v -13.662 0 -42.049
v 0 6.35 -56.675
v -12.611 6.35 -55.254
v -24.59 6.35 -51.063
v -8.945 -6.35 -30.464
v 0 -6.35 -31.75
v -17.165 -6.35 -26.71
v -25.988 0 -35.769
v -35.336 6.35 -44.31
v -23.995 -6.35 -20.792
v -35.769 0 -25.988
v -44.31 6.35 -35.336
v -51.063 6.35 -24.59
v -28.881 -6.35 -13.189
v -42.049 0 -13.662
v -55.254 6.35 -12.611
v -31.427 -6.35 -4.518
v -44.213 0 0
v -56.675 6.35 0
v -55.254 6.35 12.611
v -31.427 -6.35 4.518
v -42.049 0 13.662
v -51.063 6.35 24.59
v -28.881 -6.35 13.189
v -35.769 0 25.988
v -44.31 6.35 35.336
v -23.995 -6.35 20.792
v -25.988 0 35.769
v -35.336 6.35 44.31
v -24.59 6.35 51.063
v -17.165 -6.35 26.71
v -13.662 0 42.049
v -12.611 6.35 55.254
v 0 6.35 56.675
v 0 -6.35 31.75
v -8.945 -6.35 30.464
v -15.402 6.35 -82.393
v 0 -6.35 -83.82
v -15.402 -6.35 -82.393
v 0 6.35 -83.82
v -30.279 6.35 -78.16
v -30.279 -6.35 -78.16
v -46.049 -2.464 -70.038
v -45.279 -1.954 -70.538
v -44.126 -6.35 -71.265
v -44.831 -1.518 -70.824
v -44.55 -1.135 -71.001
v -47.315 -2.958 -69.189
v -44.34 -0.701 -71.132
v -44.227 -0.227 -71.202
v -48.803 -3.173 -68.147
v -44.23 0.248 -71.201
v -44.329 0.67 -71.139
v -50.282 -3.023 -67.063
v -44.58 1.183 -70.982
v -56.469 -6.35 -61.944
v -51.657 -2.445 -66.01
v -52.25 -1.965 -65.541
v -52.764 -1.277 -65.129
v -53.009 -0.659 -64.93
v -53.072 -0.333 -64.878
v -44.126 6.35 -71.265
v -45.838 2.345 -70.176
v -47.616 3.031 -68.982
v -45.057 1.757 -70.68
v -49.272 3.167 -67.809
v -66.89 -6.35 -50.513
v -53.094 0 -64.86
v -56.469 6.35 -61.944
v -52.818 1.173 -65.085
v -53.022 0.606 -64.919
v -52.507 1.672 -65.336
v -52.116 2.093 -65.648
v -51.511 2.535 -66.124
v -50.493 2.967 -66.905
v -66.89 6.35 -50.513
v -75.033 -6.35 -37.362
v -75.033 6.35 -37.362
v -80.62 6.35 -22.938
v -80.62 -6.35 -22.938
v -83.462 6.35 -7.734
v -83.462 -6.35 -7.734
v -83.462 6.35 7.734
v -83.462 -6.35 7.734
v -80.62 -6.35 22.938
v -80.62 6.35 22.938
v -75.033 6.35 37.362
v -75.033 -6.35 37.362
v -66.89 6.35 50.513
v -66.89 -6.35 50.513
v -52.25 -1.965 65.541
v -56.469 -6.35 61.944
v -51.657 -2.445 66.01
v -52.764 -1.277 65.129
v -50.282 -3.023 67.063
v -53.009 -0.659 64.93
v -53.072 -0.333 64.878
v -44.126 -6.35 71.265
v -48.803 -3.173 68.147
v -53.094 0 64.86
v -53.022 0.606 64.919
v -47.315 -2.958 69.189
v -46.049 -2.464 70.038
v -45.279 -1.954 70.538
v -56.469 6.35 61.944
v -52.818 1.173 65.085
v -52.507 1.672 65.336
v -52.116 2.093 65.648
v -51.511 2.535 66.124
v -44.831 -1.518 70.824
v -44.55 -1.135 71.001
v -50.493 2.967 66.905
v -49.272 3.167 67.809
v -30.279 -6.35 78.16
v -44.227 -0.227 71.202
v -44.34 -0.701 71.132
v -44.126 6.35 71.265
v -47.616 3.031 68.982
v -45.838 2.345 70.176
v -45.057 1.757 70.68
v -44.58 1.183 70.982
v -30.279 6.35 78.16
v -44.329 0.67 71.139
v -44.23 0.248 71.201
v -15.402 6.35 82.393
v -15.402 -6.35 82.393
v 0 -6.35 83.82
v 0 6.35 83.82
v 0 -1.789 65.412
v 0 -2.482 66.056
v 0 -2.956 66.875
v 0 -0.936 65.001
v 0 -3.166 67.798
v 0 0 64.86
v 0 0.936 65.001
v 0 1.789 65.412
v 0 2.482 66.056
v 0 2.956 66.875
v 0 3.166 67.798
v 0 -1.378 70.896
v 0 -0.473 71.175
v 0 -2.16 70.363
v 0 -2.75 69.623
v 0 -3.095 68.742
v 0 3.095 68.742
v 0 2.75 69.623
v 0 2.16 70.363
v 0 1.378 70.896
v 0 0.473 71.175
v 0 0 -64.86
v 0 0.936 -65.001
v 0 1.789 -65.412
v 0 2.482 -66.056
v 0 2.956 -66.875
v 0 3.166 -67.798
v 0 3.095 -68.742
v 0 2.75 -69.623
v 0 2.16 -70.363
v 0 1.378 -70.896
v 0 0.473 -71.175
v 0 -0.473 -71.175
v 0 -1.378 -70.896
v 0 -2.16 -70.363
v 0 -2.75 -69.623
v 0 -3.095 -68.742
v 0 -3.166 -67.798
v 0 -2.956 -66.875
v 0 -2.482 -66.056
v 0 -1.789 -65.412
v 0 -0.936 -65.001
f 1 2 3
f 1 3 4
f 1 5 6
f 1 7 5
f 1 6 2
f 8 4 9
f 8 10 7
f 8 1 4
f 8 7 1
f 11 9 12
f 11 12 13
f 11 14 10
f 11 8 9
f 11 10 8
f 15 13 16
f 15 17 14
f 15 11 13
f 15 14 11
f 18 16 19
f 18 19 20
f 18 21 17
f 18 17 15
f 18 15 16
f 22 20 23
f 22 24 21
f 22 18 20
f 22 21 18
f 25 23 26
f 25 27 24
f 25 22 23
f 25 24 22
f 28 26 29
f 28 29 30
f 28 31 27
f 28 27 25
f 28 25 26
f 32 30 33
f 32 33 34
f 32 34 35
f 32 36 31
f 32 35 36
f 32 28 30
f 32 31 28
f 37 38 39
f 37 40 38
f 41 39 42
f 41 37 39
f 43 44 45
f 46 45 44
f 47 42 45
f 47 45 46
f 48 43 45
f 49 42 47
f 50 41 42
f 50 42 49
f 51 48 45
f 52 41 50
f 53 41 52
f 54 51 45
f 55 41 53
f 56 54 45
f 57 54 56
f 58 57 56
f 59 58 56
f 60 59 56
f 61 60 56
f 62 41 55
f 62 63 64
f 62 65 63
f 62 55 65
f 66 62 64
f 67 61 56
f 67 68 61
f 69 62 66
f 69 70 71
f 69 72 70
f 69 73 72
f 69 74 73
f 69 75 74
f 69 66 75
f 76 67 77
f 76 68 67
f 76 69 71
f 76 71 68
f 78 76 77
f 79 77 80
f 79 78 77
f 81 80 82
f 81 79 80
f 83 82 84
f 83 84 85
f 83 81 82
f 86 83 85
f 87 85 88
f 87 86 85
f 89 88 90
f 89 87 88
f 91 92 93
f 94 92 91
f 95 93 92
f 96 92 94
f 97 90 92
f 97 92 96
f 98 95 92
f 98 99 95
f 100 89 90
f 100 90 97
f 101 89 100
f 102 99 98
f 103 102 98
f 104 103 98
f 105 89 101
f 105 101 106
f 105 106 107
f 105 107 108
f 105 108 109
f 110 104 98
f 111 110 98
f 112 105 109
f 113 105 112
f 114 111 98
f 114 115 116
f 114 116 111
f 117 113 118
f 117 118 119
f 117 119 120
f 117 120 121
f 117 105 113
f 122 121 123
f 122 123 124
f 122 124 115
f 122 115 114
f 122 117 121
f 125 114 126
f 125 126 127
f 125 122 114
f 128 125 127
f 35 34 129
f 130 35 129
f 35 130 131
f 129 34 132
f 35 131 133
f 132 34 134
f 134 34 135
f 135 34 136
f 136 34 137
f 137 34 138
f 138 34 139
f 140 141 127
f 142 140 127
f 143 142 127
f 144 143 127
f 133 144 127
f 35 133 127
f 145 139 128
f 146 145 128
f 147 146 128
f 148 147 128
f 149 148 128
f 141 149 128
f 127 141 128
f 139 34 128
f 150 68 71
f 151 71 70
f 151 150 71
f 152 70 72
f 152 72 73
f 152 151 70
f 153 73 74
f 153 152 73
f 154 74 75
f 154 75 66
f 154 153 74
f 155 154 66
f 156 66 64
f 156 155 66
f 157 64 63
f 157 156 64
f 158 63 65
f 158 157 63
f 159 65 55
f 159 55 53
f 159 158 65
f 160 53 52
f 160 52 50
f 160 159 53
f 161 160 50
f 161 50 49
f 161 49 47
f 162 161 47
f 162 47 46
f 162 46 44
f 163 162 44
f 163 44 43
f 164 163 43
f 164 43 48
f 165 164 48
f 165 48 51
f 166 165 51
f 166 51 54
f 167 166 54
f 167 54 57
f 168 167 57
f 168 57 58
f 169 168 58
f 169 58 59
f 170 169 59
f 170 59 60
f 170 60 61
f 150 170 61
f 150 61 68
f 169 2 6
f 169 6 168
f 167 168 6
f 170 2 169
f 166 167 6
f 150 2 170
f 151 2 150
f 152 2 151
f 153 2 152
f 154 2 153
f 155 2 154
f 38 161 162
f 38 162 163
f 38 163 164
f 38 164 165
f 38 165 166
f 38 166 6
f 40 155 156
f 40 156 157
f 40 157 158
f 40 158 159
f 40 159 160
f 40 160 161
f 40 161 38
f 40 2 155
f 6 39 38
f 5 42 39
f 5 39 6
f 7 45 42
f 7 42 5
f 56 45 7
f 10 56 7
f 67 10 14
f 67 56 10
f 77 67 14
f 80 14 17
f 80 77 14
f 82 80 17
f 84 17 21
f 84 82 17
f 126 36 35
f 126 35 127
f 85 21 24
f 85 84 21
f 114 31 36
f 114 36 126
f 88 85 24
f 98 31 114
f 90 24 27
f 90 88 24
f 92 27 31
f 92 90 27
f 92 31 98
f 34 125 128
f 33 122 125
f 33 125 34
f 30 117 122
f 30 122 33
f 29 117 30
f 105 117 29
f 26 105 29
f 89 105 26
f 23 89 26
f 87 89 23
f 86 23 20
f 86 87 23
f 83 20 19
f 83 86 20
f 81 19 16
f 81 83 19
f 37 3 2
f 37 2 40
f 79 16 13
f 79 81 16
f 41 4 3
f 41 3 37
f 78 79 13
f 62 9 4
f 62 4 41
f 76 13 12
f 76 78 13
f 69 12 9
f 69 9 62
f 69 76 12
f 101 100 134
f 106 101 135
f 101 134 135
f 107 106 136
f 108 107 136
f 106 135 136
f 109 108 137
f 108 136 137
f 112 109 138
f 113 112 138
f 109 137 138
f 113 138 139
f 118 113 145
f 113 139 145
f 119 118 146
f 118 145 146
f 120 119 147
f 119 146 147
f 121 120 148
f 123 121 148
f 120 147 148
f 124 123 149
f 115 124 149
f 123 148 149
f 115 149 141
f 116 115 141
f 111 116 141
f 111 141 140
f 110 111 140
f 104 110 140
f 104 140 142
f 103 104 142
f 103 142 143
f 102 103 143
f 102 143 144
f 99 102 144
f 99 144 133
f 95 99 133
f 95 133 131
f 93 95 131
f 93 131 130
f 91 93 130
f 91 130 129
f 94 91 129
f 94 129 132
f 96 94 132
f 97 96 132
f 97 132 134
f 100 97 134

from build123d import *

# Parameters (mm, degrees)
STOCK_NOS_TANK_PLATE_SUPPORT_VALVE_1_ANGLE = 180
SKETCH4_R                                  = 3.175
CUT_EXTRUDE2_DEPTH                         = 60.198


# Read off the part's stored shape, not the designer's step: Stock-Nos Tank Plate Support Valve-1
with BuildPart() as part:
    # Stock-Nos Tank Plate Support Valve-1 out → Stock-Nos Tank Plate Support Valve-1 (revolve)
    with BuildSketch(Plane(origin=(0, 0, 0), x_dir=(0, 0, -1), z_dir=(1, 0, 0))):
        Polygon((83.82, 6.35), (56.67515342, 6.35), (31.75, -6.35), (83.82, -6.35), align=None)
    revolve(axis=Axis((0, 0, 0), (0, 1, 0)), revolution_arc=STOCK_NOS_TANK_PLATE_SUPPORT_VALVE_1_ANGLE)

    # Sketch4 → Cut-Extrude2 (cut)
    with BuildSketch(Plane(origin=(0, 0, 0), x_dir=(0, 0, -1), z_dir=(1, 0, 0))):
        with Locations((-68.035369102, 0)):
            Circle(SKETCH4_R)
    cut_extrude2 = extrude(amount=-CUT_EXTRUDE2_DEPTH, mode=Mode.SUBTRACT)

    # Mirror1: Cut-Extrude2 across plane
    add(cut_extrude2.mirror(Plane.XY), mode=Mode.SUBTRACT)


solid = part.part
